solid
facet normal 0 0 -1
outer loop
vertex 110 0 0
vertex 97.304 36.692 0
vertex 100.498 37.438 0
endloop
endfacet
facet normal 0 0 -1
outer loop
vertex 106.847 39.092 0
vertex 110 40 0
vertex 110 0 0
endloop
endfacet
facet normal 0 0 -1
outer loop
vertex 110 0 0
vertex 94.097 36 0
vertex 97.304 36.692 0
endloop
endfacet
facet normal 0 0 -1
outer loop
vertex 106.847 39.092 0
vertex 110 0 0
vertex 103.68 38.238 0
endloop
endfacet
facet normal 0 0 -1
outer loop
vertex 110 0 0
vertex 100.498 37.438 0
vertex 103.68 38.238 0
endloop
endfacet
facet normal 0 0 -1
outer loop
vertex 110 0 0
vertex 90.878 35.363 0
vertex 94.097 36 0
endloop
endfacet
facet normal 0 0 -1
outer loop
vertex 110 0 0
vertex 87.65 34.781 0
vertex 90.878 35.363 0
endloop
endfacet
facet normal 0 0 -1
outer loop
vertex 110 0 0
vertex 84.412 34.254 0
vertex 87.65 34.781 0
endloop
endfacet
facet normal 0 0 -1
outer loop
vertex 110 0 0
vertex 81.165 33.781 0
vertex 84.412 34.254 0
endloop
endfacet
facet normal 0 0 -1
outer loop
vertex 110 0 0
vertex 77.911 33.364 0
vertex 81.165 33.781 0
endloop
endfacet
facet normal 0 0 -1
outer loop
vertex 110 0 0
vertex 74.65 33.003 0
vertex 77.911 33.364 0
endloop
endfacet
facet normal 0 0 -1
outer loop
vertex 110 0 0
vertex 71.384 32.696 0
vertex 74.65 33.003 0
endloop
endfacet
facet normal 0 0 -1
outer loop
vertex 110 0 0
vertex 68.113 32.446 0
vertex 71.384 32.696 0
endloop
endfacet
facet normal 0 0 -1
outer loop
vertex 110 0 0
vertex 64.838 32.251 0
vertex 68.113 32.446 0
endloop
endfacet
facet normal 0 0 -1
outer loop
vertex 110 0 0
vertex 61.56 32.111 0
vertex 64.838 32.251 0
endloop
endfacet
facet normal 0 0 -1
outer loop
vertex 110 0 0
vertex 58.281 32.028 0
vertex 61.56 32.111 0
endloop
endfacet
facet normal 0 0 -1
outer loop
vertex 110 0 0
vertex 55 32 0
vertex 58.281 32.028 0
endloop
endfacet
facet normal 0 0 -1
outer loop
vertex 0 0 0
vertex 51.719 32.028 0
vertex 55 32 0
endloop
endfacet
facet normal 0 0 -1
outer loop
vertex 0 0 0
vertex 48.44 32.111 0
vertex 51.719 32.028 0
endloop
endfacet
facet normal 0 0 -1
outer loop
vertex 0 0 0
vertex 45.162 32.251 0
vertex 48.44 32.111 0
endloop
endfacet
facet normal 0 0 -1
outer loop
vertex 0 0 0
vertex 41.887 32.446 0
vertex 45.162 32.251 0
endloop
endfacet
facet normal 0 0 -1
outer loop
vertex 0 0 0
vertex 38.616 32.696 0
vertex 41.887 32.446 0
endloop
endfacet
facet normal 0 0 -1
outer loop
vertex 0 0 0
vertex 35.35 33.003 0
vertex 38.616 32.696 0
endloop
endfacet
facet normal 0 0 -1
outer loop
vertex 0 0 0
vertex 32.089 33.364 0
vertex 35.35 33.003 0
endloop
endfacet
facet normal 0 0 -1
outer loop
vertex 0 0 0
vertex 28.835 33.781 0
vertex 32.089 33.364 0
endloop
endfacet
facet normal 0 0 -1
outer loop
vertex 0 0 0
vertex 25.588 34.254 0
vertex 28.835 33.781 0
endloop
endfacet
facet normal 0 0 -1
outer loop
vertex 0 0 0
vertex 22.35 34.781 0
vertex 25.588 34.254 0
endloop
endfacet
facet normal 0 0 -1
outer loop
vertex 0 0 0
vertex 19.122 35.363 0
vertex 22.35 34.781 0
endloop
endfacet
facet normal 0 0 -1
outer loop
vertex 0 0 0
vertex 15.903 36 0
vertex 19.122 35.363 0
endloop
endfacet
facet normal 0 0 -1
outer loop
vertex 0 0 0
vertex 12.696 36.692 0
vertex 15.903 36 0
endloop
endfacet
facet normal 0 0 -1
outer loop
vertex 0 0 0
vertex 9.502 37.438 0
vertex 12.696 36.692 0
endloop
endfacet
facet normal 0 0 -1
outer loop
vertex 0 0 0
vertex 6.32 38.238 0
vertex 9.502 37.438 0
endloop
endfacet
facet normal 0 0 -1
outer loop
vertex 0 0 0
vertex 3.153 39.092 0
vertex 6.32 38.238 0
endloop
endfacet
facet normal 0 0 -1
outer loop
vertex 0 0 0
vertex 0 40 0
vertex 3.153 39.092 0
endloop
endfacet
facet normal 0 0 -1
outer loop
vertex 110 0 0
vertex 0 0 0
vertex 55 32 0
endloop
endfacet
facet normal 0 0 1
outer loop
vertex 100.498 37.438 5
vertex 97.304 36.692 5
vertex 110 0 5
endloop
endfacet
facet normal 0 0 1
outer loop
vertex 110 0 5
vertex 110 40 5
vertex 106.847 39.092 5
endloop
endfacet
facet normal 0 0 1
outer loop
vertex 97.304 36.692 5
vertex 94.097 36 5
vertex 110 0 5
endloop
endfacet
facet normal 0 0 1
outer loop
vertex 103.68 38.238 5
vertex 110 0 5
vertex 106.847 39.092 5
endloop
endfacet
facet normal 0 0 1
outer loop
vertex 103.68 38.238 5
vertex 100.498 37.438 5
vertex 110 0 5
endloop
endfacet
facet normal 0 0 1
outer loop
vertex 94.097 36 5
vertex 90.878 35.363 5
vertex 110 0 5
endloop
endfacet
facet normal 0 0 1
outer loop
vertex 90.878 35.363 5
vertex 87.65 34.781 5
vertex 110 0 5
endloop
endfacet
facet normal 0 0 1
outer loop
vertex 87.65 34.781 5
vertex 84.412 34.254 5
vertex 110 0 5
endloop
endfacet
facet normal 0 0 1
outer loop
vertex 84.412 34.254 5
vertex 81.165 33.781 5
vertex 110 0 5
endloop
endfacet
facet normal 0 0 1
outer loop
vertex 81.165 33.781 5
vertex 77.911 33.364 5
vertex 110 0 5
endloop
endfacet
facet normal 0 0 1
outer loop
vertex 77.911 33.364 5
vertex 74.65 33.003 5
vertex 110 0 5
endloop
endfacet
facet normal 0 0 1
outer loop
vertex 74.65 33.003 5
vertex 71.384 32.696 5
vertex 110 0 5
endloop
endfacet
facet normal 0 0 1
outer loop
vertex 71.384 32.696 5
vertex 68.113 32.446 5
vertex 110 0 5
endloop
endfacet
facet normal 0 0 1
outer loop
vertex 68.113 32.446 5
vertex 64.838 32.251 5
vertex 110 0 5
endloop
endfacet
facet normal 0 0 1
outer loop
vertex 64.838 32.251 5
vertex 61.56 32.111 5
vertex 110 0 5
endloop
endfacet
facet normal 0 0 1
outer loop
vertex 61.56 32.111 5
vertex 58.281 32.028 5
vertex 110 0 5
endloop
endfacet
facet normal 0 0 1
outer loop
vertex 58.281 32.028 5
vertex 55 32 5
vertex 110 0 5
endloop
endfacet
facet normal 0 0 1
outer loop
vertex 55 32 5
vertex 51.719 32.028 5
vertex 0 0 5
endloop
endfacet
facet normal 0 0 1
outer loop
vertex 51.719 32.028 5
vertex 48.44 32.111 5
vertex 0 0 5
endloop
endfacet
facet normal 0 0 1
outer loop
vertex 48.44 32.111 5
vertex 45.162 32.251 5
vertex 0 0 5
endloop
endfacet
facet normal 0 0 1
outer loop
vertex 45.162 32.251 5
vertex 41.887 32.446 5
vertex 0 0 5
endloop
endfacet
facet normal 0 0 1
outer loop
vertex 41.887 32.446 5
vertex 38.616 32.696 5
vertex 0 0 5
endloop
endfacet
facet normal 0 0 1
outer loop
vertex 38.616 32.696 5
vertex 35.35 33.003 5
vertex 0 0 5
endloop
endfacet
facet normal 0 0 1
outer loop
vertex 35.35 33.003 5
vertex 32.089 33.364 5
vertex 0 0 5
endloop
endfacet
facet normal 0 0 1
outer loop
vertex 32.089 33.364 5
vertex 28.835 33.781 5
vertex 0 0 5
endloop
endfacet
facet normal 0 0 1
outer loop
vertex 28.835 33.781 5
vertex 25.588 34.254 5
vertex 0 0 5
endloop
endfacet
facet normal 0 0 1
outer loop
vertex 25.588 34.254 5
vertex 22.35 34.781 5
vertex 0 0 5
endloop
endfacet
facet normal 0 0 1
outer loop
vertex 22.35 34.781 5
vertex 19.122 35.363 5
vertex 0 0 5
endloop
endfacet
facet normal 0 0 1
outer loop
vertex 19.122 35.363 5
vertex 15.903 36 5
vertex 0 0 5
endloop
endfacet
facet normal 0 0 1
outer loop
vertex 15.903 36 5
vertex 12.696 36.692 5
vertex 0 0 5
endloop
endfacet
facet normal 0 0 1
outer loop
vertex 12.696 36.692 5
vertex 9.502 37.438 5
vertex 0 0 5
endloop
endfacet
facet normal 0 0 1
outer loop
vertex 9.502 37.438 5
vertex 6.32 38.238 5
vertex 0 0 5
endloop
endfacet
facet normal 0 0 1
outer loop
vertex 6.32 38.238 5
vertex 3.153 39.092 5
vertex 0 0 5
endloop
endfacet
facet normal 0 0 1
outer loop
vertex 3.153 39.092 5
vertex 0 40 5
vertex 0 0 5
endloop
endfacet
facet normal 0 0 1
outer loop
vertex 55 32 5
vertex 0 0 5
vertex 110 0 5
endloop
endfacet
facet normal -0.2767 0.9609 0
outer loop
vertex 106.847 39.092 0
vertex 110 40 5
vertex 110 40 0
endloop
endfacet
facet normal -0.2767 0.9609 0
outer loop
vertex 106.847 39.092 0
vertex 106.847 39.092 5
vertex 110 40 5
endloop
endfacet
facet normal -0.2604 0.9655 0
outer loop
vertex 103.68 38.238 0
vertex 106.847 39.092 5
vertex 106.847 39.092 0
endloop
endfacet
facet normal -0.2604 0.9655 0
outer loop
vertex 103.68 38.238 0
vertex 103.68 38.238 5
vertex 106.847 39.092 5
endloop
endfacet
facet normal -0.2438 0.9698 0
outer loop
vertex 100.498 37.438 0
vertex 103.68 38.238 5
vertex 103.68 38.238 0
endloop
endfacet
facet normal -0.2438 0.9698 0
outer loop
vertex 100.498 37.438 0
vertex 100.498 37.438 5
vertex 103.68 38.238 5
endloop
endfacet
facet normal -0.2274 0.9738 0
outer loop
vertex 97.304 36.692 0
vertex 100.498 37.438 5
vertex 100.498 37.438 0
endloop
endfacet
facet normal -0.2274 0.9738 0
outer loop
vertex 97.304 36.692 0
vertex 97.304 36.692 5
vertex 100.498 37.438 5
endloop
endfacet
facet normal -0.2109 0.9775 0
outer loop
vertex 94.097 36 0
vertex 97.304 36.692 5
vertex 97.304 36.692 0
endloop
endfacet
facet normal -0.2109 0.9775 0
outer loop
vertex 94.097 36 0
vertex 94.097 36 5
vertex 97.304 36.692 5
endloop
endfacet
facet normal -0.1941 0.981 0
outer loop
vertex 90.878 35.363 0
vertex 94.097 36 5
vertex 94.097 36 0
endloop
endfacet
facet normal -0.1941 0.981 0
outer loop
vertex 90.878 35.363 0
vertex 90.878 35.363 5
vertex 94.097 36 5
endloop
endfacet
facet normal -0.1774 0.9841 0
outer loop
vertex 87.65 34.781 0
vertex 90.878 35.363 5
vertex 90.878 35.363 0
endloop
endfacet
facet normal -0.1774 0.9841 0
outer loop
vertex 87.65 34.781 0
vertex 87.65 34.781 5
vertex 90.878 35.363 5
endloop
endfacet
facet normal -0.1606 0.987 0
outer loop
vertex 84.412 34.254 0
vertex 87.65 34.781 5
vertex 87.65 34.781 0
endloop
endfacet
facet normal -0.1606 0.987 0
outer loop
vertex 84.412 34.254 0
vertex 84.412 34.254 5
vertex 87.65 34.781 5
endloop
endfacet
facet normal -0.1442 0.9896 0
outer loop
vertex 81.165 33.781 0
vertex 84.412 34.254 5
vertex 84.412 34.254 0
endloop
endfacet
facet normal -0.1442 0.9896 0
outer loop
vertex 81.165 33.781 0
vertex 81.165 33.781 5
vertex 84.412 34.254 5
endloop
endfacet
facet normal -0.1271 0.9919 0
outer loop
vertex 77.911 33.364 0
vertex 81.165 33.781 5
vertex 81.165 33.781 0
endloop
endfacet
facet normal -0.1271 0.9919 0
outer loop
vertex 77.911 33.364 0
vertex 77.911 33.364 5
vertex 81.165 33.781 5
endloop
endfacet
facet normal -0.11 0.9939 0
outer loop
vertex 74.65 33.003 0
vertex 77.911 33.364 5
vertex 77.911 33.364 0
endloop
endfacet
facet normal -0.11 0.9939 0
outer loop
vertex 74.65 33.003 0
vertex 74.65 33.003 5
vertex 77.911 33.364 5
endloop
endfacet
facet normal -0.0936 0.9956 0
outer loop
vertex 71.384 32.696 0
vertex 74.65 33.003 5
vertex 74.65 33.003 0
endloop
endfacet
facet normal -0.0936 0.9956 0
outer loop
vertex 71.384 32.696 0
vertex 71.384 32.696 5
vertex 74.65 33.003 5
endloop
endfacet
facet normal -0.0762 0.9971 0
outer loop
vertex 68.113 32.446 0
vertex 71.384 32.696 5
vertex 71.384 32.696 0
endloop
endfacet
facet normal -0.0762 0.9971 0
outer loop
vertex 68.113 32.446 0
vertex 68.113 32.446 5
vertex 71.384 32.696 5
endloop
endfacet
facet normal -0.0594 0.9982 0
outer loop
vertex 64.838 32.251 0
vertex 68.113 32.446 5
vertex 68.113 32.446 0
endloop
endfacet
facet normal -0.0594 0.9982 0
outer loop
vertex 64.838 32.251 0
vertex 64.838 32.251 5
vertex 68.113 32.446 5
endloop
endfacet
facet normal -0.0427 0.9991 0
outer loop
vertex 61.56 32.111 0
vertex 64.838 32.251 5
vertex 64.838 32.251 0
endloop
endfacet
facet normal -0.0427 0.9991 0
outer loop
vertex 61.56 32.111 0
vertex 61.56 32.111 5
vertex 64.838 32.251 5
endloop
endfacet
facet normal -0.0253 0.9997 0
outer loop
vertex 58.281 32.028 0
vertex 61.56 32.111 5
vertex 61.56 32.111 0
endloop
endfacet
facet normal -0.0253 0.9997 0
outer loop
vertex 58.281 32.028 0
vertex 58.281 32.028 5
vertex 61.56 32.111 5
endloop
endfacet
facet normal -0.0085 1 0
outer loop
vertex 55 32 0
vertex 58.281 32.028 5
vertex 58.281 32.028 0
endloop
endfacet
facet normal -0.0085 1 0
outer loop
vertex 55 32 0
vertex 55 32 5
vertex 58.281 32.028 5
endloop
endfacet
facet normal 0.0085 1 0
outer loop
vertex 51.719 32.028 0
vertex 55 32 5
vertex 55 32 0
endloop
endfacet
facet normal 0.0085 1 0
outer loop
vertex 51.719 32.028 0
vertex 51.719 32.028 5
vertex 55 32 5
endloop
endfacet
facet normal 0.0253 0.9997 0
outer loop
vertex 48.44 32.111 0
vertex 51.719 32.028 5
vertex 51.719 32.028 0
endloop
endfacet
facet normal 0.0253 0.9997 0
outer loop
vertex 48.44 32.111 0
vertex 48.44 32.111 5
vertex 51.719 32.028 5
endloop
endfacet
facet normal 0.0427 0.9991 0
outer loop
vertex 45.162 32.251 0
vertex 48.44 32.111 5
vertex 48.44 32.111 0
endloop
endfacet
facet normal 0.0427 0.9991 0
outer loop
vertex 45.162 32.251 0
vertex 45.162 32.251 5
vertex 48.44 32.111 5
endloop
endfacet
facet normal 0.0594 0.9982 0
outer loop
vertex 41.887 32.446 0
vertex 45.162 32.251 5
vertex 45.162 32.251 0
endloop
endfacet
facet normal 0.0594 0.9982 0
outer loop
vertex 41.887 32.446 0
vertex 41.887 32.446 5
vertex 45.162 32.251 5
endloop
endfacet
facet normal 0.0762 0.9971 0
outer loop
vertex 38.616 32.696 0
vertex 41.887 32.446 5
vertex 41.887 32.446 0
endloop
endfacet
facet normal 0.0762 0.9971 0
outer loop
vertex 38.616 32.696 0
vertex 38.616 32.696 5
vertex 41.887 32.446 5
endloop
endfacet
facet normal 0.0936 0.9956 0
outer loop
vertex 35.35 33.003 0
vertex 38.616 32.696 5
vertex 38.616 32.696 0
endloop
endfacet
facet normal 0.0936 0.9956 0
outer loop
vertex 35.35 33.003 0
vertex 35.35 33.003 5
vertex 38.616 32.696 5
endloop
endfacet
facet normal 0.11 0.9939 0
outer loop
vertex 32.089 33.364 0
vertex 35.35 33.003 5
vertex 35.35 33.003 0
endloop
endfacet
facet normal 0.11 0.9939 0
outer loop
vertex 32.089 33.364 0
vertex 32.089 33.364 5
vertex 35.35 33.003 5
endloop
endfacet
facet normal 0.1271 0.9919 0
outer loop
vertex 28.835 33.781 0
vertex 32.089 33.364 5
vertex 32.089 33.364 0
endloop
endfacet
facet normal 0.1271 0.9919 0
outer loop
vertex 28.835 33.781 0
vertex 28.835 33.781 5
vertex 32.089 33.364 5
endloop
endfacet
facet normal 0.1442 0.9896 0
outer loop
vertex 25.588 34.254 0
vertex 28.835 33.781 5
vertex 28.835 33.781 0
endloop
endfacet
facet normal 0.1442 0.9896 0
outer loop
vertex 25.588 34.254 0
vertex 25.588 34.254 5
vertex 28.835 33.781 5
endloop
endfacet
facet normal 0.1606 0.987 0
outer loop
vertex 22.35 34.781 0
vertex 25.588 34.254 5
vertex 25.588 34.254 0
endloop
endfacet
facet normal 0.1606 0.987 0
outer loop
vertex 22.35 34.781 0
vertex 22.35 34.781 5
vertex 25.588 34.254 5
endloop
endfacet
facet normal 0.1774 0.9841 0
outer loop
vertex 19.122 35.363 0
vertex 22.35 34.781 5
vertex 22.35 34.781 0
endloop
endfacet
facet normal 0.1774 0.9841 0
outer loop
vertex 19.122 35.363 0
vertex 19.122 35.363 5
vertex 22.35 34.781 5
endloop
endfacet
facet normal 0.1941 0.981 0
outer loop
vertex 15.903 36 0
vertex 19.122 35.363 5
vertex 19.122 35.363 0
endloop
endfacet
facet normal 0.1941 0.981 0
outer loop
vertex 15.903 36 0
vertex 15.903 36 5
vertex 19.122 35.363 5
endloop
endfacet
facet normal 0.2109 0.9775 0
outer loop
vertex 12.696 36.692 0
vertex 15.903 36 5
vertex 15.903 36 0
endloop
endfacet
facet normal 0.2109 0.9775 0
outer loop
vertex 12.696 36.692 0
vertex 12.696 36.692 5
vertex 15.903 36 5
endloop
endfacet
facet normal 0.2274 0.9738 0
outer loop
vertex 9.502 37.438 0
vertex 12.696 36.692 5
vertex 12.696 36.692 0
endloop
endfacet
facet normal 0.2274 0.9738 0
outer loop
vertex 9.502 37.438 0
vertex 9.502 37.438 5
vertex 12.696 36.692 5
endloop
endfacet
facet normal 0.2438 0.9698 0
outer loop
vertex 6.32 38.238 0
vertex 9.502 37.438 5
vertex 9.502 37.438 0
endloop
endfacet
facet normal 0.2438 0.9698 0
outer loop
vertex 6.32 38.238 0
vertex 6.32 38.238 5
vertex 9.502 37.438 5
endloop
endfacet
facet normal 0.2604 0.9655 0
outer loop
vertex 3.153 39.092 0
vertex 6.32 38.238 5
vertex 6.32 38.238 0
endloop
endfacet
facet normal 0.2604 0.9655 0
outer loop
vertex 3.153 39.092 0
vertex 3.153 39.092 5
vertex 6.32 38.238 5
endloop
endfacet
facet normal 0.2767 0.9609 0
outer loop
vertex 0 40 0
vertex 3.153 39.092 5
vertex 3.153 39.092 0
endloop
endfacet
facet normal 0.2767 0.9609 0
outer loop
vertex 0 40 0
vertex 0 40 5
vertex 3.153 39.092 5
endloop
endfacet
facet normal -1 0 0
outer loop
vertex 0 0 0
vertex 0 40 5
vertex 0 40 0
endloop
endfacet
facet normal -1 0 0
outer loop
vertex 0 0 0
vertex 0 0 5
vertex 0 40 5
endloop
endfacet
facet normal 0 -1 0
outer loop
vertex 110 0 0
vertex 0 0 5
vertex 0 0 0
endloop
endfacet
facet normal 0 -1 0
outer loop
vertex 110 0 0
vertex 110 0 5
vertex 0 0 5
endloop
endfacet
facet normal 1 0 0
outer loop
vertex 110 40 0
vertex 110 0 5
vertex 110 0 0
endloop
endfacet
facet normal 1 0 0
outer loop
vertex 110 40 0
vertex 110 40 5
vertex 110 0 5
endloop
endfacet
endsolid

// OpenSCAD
$fn = 32;

// ----------------------------------------------------------------------
// Arc profile plate: notch, 37 points
// ----------------------------------------------------------------------

// --- parameters (mm) ---
bar_l = 110;              // bar length, X
bar_w = 40;               // bar width, Y
notch_depth = 8;          // depth of the arc notch at mid-span
arc_r = 193.06;           // radius of the notch arc
arc_angle = 33.1;         // notch arc angle, degrees
arc_step = 1;             // sampling step of the notch arc, degrees
plate_t = 5;              // plate thickness, Z

profile = [[0, 0], [110, 0], [110, 40], [106.847, 39.092], [103.68, 38.238], [100.498, 37.438], [97.304, 36.692], [94.097, 36], [90.878, 35.363], [87.65, 34.781], [84.412, 34.254], [81.165, 33.781], [77.911, 33.364], [74.65, 33.003], [71.384, 32.696], [68.113, 32.446], [64.838, 32.251], [61.56, 32.111], [58.281, 32.028], [55, 32], [51.719, 32.028], [48.44, 32.111], [45.162, 32.251], [41.887, 32.446], [38.616, 32.696], [35.35, 33.003], [32.089, 33.364], [28.835, 33.781], [25.588, 34.254], [22.35, 34.781], [19.122, 35.363], [15.903, 36], [12.696, 36.692], [9.502, 37.438], [6.32, 38.238], [3.153, 39.092], [0, 40]];  // primary outline, 37 points, counter clockwise

// --- the one profile operation ---
linear_extrude(height = plate_t) polygon(points = profile);
